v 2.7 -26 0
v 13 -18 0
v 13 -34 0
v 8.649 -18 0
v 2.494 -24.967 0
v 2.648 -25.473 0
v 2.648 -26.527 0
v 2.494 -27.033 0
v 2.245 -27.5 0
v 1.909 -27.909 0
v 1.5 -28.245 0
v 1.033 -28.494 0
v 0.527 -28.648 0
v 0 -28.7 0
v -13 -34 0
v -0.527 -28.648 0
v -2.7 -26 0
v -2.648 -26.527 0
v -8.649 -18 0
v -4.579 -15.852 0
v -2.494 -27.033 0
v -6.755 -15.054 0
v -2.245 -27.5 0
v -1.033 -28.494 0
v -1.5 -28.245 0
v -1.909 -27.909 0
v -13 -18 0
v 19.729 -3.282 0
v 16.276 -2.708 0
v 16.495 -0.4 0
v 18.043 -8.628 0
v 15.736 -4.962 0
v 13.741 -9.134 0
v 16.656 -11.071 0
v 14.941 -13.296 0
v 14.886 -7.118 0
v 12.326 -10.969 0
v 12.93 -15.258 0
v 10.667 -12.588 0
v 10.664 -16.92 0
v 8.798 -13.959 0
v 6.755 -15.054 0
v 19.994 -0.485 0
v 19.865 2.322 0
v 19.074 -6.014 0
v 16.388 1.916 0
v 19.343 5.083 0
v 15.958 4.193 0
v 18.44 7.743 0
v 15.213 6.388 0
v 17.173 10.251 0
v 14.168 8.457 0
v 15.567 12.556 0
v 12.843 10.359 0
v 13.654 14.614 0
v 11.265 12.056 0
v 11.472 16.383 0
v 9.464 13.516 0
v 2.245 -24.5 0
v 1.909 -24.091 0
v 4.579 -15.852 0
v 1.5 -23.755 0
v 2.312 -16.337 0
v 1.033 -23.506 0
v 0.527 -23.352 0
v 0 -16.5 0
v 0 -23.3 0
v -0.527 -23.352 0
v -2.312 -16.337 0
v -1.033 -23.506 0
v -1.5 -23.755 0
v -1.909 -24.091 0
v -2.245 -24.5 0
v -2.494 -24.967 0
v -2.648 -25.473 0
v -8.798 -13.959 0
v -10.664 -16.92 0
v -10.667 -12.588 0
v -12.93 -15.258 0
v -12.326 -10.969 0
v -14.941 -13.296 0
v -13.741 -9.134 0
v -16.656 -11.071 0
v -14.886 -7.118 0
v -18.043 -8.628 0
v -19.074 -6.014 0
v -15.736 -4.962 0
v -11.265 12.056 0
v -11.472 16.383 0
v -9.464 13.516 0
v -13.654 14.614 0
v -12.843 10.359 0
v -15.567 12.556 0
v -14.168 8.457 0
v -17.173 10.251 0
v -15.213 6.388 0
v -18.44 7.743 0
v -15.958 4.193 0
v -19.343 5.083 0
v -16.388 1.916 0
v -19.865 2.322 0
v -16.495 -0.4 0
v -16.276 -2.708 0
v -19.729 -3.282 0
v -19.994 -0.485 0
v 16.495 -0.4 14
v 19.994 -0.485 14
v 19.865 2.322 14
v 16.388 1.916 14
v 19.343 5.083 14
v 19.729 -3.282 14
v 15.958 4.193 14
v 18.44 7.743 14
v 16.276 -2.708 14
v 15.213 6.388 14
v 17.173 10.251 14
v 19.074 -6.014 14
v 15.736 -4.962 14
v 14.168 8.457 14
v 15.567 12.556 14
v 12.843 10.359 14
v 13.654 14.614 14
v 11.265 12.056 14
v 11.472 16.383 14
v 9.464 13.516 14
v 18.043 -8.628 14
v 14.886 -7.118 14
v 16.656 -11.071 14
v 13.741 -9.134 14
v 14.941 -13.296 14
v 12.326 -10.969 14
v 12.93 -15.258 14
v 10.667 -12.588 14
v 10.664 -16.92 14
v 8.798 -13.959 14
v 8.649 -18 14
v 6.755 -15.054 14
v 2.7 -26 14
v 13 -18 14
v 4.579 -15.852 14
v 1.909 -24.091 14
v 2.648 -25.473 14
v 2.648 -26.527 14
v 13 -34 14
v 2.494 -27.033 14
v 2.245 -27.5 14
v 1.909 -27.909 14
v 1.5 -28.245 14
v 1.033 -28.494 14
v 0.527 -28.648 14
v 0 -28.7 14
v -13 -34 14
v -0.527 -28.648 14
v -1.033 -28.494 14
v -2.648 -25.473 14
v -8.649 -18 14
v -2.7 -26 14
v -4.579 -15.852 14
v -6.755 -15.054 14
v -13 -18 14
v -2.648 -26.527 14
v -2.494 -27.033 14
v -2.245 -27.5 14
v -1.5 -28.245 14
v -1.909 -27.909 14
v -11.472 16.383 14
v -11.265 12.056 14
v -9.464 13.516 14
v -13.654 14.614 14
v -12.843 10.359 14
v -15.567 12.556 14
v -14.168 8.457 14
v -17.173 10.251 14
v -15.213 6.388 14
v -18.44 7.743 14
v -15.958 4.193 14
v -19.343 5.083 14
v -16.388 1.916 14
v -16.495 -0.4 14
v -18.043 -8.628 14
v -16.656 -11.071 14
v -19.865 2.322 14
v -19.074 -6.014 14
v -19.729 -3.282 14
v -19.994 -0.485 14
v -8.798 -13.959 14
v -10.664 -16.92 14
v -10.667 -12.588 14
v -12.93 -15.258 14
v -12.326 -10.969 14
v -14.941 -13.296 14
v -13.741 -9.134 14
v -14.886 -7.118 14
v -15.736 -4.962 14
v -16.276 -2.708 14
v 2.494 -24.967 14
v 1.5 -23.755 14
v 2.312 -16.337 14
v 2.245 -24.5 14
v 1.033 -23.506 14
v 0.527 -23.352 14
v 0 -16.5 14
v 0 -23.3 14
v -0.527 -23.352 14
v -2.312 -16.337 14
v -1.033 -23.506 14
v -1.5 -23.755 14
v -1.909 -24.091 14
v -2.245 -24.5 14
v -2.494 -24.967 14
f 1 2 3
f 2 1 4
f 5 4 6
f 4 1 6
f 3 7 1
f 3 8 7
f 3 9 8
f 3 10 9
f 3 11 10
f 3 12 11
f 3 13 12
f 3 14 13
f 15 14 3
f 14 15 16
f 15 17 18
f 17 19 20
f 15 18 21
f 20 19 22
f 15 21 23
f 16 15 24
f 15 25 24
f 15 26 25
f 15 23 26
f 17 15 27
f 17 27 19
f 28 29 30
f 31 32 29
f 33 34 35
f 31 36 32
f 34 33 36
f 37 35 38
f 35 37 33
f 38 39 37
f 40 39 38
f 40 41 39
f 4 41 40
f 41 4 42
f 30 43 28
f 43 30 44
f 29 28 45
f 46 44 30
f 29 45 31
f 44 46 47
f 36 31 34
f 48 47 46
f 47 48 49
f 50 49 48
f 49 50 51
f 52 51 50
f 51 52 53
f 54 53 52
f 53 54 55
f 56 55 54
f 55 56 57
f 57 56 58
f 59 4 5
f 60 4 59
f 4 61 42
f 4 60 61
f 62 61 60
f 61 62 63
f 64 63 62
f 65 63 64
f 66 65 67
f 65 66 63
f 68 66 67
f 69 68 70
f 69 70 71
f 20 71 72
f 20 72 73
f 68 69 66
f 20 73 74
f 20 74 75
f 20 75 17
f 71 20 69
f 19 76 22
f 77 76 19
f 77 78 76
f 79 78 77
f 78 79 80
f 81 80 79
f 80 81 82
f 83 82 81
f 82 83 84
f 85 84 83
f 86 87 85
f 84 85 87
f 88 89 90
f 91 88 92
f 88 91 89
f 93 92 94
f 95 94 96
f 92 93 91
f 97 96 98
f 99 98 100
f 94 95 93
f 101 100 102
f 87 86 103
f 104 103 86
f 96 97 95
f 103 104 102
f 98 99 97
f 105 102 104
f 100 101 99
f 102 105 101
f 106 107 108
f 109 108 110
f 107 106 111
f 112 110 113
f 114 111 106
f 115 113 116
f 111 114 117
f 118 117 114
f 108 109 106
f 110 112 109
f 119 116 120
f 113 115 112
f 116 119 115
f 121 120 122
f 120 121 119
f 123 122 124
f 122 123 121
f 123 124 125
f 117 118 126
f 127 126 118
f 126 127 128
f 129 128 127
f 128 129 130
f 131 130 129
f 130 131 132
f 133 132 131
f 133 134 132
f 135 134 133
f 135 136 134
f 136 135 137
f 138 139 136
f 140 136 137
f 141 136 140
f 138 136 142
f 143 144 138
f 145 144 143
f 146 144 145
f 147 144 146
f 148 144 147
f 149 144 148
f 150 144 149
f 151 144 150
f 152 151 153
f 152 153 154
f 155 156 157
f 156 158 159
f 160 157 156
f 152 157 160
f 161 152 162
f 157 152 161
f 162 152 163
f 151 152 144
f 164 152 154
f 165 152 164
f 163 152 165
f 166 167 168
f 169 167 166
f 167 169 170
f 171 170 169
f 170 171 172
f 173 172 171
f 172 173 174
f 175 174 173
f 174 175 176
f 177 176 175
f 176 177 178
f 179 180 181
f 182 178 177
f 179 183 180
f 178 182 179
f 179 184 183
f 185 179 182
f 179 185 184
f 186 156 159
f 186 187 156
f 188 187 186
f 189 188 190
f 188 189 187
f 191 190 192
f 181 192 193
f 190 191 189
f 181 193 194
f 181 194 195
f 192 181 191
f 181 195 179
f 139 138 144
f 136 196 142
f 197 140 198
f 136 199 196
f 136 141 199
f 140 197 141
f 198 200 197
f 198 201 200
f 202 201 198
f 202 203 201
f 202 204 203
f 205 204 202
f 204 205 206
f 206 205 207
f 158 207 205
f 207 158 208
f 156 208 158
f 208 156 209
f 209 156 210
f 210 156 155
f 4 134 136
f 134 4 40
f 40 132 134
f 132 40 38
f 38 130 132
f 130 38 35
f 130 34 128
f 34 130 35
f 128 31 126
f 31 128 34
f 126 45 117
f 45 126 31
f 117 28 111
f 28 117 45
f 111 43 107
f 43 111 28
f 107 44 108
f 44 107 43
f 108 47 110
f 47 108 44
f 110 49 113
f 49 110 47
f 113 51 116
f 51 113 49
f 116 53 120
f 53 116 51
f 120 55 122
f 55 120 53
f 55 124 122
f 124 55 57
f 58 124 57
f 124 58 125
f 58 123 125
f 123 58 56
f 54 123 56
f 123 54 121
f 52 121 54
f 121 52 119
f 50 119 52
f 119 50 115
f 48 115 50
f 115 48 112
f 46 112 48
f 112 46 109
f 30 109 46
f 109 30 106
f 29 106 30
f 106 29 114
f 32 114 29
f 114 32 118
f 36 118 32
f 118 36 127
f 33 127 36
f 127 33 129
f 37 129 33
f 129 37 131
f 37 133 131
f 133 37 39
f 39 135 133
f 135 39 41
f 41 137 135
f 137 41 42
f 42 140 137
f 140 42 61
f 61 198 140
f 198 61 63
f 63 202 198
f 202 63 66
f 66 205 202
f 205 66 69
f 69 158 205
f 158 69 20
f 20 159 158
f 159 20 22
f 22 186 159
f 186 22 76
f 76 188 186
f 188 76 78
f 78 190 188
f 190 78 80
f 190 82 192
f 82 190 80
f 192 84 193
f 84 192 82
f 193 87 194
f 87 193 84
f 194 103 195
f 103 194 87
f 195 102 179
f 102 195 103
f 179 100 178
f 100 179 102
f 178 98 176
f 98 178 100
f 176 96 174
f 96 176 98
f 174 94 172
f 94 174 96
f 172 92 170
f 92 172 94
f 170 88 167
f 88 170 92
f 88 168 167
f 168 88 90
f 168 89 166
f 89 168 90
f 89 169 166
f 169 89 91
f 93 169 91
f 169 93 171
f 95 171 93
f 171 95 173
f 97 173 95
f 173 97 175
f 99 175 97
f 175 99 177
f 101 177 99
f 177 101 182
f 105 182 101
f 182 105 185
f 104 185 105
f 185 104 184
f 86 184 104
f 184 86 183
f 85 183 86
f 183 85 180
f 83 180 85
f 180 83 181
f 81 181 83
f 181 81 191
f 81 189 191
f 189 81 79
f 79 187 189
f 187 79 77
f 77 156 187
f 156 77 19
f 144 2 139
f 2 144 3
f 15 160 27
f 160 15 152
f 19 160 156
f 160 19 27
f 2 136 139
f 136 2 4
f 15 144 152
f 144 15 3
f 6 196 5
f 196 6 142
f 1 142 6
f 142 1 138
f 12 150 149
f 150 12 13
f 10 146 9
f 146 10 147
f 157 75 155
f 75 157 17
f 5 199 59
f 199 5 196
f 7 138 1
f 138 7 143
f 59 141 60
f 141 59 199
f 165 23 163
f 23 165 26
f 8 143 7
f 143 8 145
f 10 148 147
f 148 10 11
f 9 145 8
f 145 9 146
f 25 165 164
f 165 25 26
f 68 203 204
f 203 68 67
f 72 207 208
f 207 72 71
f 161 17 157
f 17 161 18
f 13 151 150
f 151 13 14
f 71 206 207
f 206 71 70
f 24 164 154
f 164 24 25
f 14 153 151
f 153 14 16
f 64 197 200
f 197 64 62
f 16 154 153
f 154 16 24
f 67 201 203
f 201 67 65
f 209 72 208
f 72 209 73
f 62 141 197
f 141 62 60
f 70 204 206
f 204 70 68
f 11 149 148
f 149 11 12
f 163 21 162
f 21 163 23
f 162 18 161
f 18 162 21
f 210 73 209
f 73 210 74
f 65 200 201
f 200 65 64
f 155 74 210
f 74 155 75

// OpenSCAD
$fn = 32;

// ----------------------------------------------------------------------
// Spring clip: 40 mm outside, 3.5 mm band, 70 degree opening
// ----------------------------------------------------------------------

// --- parameters (mm) ---
outer_r = 20;             // clip outside radius
inner_r = 16.5;           // clip bore radius
band = 3.5;               // band thickness
clip_w = 14;              // clip width
opening = 70;             // opening angle
tab_w = 26;               // tab width
tab_len = 14;             // tab length past the clip
tab_hole = 5.4;           // tab fixing hole

clip_profile = [[-11.472, 16.383], [-13.654, 14.614], [-15.567, 12.556], [-17.173, 10.251], [-18.44, 7.743], [-19.343, 5.083], [-19.865, 2.322], [-19.994, -0.485], [-19.729, -3.282], [-19.074, -6.014], [-18.043, -8.628], [-16.656, -11.071], [-14.941, -13.296], [-12.93, -15.258], [-10.664, -16.92], [-8.188, -18.247], [-5.55, -19.215], [-2.803, -19.803], [0, -20], [2.803, -19.803], [5.55, -19.215], [8.188, -18.247], [10.664, -16.92], [12.93, -15.258], [14.941, -13.296], [16.656, -11.071], [18.043, -8.628], [19.074, -6.014], [19.729, -3.282], [19.994, -0.485], [19.865, 2.322], [19.343, 5.083], [18.44, 7.743], [17.173, 10.251], [15.567, 12.556], [13.654, 14.614], [11.472, 16.383], [9.464, 13.516], [11.265, 12.056], [12.843, 10.359], [14.168, 8.457], [15.213, 6.388], [15.958, 4.193], [16.388, 1.916], [16.495, -0.4], [16.276, -2.708], [15.736, -4.962], [14.886, -7.118], [13.741, -9.134], [12.326, -10.969], [10.667, -12.588], [8.798, -13.959], [6.755, -15.054], [4.579, -15.852], [2.312, -16.337], [0, -16.5], [-2.312, -16.337], [-4.579, -15.852], [-6.755, -15.054], [-8.798, -13.959], [-10.667, -12.588], [-12.326, -10.969], [-13.741, -9.134], [-14.886, -7.118], [-15.736, -4.962], [-16.276, -2.708], [-16.495, -0.4], [-16.388, 1.916], [-15.958, 4.193], [-15.213, 6.388], [-14.168, 8.457], [-12.843, 10.359], [-11.265, 12.056], [-9.464, 13.516]];

difference() {
  union() {
    linear_extrude(height = clip_w) polygon(clip_profile);
    /* mounting tab, sunk 2 mm into the band */
    translate([-13, -34, 0]) cube([tab_w, 16, clip_w]);
  }
  translate([0, -26, -2.5]) cylinder(h = clip_w + 5, d = tab_hole);
}
